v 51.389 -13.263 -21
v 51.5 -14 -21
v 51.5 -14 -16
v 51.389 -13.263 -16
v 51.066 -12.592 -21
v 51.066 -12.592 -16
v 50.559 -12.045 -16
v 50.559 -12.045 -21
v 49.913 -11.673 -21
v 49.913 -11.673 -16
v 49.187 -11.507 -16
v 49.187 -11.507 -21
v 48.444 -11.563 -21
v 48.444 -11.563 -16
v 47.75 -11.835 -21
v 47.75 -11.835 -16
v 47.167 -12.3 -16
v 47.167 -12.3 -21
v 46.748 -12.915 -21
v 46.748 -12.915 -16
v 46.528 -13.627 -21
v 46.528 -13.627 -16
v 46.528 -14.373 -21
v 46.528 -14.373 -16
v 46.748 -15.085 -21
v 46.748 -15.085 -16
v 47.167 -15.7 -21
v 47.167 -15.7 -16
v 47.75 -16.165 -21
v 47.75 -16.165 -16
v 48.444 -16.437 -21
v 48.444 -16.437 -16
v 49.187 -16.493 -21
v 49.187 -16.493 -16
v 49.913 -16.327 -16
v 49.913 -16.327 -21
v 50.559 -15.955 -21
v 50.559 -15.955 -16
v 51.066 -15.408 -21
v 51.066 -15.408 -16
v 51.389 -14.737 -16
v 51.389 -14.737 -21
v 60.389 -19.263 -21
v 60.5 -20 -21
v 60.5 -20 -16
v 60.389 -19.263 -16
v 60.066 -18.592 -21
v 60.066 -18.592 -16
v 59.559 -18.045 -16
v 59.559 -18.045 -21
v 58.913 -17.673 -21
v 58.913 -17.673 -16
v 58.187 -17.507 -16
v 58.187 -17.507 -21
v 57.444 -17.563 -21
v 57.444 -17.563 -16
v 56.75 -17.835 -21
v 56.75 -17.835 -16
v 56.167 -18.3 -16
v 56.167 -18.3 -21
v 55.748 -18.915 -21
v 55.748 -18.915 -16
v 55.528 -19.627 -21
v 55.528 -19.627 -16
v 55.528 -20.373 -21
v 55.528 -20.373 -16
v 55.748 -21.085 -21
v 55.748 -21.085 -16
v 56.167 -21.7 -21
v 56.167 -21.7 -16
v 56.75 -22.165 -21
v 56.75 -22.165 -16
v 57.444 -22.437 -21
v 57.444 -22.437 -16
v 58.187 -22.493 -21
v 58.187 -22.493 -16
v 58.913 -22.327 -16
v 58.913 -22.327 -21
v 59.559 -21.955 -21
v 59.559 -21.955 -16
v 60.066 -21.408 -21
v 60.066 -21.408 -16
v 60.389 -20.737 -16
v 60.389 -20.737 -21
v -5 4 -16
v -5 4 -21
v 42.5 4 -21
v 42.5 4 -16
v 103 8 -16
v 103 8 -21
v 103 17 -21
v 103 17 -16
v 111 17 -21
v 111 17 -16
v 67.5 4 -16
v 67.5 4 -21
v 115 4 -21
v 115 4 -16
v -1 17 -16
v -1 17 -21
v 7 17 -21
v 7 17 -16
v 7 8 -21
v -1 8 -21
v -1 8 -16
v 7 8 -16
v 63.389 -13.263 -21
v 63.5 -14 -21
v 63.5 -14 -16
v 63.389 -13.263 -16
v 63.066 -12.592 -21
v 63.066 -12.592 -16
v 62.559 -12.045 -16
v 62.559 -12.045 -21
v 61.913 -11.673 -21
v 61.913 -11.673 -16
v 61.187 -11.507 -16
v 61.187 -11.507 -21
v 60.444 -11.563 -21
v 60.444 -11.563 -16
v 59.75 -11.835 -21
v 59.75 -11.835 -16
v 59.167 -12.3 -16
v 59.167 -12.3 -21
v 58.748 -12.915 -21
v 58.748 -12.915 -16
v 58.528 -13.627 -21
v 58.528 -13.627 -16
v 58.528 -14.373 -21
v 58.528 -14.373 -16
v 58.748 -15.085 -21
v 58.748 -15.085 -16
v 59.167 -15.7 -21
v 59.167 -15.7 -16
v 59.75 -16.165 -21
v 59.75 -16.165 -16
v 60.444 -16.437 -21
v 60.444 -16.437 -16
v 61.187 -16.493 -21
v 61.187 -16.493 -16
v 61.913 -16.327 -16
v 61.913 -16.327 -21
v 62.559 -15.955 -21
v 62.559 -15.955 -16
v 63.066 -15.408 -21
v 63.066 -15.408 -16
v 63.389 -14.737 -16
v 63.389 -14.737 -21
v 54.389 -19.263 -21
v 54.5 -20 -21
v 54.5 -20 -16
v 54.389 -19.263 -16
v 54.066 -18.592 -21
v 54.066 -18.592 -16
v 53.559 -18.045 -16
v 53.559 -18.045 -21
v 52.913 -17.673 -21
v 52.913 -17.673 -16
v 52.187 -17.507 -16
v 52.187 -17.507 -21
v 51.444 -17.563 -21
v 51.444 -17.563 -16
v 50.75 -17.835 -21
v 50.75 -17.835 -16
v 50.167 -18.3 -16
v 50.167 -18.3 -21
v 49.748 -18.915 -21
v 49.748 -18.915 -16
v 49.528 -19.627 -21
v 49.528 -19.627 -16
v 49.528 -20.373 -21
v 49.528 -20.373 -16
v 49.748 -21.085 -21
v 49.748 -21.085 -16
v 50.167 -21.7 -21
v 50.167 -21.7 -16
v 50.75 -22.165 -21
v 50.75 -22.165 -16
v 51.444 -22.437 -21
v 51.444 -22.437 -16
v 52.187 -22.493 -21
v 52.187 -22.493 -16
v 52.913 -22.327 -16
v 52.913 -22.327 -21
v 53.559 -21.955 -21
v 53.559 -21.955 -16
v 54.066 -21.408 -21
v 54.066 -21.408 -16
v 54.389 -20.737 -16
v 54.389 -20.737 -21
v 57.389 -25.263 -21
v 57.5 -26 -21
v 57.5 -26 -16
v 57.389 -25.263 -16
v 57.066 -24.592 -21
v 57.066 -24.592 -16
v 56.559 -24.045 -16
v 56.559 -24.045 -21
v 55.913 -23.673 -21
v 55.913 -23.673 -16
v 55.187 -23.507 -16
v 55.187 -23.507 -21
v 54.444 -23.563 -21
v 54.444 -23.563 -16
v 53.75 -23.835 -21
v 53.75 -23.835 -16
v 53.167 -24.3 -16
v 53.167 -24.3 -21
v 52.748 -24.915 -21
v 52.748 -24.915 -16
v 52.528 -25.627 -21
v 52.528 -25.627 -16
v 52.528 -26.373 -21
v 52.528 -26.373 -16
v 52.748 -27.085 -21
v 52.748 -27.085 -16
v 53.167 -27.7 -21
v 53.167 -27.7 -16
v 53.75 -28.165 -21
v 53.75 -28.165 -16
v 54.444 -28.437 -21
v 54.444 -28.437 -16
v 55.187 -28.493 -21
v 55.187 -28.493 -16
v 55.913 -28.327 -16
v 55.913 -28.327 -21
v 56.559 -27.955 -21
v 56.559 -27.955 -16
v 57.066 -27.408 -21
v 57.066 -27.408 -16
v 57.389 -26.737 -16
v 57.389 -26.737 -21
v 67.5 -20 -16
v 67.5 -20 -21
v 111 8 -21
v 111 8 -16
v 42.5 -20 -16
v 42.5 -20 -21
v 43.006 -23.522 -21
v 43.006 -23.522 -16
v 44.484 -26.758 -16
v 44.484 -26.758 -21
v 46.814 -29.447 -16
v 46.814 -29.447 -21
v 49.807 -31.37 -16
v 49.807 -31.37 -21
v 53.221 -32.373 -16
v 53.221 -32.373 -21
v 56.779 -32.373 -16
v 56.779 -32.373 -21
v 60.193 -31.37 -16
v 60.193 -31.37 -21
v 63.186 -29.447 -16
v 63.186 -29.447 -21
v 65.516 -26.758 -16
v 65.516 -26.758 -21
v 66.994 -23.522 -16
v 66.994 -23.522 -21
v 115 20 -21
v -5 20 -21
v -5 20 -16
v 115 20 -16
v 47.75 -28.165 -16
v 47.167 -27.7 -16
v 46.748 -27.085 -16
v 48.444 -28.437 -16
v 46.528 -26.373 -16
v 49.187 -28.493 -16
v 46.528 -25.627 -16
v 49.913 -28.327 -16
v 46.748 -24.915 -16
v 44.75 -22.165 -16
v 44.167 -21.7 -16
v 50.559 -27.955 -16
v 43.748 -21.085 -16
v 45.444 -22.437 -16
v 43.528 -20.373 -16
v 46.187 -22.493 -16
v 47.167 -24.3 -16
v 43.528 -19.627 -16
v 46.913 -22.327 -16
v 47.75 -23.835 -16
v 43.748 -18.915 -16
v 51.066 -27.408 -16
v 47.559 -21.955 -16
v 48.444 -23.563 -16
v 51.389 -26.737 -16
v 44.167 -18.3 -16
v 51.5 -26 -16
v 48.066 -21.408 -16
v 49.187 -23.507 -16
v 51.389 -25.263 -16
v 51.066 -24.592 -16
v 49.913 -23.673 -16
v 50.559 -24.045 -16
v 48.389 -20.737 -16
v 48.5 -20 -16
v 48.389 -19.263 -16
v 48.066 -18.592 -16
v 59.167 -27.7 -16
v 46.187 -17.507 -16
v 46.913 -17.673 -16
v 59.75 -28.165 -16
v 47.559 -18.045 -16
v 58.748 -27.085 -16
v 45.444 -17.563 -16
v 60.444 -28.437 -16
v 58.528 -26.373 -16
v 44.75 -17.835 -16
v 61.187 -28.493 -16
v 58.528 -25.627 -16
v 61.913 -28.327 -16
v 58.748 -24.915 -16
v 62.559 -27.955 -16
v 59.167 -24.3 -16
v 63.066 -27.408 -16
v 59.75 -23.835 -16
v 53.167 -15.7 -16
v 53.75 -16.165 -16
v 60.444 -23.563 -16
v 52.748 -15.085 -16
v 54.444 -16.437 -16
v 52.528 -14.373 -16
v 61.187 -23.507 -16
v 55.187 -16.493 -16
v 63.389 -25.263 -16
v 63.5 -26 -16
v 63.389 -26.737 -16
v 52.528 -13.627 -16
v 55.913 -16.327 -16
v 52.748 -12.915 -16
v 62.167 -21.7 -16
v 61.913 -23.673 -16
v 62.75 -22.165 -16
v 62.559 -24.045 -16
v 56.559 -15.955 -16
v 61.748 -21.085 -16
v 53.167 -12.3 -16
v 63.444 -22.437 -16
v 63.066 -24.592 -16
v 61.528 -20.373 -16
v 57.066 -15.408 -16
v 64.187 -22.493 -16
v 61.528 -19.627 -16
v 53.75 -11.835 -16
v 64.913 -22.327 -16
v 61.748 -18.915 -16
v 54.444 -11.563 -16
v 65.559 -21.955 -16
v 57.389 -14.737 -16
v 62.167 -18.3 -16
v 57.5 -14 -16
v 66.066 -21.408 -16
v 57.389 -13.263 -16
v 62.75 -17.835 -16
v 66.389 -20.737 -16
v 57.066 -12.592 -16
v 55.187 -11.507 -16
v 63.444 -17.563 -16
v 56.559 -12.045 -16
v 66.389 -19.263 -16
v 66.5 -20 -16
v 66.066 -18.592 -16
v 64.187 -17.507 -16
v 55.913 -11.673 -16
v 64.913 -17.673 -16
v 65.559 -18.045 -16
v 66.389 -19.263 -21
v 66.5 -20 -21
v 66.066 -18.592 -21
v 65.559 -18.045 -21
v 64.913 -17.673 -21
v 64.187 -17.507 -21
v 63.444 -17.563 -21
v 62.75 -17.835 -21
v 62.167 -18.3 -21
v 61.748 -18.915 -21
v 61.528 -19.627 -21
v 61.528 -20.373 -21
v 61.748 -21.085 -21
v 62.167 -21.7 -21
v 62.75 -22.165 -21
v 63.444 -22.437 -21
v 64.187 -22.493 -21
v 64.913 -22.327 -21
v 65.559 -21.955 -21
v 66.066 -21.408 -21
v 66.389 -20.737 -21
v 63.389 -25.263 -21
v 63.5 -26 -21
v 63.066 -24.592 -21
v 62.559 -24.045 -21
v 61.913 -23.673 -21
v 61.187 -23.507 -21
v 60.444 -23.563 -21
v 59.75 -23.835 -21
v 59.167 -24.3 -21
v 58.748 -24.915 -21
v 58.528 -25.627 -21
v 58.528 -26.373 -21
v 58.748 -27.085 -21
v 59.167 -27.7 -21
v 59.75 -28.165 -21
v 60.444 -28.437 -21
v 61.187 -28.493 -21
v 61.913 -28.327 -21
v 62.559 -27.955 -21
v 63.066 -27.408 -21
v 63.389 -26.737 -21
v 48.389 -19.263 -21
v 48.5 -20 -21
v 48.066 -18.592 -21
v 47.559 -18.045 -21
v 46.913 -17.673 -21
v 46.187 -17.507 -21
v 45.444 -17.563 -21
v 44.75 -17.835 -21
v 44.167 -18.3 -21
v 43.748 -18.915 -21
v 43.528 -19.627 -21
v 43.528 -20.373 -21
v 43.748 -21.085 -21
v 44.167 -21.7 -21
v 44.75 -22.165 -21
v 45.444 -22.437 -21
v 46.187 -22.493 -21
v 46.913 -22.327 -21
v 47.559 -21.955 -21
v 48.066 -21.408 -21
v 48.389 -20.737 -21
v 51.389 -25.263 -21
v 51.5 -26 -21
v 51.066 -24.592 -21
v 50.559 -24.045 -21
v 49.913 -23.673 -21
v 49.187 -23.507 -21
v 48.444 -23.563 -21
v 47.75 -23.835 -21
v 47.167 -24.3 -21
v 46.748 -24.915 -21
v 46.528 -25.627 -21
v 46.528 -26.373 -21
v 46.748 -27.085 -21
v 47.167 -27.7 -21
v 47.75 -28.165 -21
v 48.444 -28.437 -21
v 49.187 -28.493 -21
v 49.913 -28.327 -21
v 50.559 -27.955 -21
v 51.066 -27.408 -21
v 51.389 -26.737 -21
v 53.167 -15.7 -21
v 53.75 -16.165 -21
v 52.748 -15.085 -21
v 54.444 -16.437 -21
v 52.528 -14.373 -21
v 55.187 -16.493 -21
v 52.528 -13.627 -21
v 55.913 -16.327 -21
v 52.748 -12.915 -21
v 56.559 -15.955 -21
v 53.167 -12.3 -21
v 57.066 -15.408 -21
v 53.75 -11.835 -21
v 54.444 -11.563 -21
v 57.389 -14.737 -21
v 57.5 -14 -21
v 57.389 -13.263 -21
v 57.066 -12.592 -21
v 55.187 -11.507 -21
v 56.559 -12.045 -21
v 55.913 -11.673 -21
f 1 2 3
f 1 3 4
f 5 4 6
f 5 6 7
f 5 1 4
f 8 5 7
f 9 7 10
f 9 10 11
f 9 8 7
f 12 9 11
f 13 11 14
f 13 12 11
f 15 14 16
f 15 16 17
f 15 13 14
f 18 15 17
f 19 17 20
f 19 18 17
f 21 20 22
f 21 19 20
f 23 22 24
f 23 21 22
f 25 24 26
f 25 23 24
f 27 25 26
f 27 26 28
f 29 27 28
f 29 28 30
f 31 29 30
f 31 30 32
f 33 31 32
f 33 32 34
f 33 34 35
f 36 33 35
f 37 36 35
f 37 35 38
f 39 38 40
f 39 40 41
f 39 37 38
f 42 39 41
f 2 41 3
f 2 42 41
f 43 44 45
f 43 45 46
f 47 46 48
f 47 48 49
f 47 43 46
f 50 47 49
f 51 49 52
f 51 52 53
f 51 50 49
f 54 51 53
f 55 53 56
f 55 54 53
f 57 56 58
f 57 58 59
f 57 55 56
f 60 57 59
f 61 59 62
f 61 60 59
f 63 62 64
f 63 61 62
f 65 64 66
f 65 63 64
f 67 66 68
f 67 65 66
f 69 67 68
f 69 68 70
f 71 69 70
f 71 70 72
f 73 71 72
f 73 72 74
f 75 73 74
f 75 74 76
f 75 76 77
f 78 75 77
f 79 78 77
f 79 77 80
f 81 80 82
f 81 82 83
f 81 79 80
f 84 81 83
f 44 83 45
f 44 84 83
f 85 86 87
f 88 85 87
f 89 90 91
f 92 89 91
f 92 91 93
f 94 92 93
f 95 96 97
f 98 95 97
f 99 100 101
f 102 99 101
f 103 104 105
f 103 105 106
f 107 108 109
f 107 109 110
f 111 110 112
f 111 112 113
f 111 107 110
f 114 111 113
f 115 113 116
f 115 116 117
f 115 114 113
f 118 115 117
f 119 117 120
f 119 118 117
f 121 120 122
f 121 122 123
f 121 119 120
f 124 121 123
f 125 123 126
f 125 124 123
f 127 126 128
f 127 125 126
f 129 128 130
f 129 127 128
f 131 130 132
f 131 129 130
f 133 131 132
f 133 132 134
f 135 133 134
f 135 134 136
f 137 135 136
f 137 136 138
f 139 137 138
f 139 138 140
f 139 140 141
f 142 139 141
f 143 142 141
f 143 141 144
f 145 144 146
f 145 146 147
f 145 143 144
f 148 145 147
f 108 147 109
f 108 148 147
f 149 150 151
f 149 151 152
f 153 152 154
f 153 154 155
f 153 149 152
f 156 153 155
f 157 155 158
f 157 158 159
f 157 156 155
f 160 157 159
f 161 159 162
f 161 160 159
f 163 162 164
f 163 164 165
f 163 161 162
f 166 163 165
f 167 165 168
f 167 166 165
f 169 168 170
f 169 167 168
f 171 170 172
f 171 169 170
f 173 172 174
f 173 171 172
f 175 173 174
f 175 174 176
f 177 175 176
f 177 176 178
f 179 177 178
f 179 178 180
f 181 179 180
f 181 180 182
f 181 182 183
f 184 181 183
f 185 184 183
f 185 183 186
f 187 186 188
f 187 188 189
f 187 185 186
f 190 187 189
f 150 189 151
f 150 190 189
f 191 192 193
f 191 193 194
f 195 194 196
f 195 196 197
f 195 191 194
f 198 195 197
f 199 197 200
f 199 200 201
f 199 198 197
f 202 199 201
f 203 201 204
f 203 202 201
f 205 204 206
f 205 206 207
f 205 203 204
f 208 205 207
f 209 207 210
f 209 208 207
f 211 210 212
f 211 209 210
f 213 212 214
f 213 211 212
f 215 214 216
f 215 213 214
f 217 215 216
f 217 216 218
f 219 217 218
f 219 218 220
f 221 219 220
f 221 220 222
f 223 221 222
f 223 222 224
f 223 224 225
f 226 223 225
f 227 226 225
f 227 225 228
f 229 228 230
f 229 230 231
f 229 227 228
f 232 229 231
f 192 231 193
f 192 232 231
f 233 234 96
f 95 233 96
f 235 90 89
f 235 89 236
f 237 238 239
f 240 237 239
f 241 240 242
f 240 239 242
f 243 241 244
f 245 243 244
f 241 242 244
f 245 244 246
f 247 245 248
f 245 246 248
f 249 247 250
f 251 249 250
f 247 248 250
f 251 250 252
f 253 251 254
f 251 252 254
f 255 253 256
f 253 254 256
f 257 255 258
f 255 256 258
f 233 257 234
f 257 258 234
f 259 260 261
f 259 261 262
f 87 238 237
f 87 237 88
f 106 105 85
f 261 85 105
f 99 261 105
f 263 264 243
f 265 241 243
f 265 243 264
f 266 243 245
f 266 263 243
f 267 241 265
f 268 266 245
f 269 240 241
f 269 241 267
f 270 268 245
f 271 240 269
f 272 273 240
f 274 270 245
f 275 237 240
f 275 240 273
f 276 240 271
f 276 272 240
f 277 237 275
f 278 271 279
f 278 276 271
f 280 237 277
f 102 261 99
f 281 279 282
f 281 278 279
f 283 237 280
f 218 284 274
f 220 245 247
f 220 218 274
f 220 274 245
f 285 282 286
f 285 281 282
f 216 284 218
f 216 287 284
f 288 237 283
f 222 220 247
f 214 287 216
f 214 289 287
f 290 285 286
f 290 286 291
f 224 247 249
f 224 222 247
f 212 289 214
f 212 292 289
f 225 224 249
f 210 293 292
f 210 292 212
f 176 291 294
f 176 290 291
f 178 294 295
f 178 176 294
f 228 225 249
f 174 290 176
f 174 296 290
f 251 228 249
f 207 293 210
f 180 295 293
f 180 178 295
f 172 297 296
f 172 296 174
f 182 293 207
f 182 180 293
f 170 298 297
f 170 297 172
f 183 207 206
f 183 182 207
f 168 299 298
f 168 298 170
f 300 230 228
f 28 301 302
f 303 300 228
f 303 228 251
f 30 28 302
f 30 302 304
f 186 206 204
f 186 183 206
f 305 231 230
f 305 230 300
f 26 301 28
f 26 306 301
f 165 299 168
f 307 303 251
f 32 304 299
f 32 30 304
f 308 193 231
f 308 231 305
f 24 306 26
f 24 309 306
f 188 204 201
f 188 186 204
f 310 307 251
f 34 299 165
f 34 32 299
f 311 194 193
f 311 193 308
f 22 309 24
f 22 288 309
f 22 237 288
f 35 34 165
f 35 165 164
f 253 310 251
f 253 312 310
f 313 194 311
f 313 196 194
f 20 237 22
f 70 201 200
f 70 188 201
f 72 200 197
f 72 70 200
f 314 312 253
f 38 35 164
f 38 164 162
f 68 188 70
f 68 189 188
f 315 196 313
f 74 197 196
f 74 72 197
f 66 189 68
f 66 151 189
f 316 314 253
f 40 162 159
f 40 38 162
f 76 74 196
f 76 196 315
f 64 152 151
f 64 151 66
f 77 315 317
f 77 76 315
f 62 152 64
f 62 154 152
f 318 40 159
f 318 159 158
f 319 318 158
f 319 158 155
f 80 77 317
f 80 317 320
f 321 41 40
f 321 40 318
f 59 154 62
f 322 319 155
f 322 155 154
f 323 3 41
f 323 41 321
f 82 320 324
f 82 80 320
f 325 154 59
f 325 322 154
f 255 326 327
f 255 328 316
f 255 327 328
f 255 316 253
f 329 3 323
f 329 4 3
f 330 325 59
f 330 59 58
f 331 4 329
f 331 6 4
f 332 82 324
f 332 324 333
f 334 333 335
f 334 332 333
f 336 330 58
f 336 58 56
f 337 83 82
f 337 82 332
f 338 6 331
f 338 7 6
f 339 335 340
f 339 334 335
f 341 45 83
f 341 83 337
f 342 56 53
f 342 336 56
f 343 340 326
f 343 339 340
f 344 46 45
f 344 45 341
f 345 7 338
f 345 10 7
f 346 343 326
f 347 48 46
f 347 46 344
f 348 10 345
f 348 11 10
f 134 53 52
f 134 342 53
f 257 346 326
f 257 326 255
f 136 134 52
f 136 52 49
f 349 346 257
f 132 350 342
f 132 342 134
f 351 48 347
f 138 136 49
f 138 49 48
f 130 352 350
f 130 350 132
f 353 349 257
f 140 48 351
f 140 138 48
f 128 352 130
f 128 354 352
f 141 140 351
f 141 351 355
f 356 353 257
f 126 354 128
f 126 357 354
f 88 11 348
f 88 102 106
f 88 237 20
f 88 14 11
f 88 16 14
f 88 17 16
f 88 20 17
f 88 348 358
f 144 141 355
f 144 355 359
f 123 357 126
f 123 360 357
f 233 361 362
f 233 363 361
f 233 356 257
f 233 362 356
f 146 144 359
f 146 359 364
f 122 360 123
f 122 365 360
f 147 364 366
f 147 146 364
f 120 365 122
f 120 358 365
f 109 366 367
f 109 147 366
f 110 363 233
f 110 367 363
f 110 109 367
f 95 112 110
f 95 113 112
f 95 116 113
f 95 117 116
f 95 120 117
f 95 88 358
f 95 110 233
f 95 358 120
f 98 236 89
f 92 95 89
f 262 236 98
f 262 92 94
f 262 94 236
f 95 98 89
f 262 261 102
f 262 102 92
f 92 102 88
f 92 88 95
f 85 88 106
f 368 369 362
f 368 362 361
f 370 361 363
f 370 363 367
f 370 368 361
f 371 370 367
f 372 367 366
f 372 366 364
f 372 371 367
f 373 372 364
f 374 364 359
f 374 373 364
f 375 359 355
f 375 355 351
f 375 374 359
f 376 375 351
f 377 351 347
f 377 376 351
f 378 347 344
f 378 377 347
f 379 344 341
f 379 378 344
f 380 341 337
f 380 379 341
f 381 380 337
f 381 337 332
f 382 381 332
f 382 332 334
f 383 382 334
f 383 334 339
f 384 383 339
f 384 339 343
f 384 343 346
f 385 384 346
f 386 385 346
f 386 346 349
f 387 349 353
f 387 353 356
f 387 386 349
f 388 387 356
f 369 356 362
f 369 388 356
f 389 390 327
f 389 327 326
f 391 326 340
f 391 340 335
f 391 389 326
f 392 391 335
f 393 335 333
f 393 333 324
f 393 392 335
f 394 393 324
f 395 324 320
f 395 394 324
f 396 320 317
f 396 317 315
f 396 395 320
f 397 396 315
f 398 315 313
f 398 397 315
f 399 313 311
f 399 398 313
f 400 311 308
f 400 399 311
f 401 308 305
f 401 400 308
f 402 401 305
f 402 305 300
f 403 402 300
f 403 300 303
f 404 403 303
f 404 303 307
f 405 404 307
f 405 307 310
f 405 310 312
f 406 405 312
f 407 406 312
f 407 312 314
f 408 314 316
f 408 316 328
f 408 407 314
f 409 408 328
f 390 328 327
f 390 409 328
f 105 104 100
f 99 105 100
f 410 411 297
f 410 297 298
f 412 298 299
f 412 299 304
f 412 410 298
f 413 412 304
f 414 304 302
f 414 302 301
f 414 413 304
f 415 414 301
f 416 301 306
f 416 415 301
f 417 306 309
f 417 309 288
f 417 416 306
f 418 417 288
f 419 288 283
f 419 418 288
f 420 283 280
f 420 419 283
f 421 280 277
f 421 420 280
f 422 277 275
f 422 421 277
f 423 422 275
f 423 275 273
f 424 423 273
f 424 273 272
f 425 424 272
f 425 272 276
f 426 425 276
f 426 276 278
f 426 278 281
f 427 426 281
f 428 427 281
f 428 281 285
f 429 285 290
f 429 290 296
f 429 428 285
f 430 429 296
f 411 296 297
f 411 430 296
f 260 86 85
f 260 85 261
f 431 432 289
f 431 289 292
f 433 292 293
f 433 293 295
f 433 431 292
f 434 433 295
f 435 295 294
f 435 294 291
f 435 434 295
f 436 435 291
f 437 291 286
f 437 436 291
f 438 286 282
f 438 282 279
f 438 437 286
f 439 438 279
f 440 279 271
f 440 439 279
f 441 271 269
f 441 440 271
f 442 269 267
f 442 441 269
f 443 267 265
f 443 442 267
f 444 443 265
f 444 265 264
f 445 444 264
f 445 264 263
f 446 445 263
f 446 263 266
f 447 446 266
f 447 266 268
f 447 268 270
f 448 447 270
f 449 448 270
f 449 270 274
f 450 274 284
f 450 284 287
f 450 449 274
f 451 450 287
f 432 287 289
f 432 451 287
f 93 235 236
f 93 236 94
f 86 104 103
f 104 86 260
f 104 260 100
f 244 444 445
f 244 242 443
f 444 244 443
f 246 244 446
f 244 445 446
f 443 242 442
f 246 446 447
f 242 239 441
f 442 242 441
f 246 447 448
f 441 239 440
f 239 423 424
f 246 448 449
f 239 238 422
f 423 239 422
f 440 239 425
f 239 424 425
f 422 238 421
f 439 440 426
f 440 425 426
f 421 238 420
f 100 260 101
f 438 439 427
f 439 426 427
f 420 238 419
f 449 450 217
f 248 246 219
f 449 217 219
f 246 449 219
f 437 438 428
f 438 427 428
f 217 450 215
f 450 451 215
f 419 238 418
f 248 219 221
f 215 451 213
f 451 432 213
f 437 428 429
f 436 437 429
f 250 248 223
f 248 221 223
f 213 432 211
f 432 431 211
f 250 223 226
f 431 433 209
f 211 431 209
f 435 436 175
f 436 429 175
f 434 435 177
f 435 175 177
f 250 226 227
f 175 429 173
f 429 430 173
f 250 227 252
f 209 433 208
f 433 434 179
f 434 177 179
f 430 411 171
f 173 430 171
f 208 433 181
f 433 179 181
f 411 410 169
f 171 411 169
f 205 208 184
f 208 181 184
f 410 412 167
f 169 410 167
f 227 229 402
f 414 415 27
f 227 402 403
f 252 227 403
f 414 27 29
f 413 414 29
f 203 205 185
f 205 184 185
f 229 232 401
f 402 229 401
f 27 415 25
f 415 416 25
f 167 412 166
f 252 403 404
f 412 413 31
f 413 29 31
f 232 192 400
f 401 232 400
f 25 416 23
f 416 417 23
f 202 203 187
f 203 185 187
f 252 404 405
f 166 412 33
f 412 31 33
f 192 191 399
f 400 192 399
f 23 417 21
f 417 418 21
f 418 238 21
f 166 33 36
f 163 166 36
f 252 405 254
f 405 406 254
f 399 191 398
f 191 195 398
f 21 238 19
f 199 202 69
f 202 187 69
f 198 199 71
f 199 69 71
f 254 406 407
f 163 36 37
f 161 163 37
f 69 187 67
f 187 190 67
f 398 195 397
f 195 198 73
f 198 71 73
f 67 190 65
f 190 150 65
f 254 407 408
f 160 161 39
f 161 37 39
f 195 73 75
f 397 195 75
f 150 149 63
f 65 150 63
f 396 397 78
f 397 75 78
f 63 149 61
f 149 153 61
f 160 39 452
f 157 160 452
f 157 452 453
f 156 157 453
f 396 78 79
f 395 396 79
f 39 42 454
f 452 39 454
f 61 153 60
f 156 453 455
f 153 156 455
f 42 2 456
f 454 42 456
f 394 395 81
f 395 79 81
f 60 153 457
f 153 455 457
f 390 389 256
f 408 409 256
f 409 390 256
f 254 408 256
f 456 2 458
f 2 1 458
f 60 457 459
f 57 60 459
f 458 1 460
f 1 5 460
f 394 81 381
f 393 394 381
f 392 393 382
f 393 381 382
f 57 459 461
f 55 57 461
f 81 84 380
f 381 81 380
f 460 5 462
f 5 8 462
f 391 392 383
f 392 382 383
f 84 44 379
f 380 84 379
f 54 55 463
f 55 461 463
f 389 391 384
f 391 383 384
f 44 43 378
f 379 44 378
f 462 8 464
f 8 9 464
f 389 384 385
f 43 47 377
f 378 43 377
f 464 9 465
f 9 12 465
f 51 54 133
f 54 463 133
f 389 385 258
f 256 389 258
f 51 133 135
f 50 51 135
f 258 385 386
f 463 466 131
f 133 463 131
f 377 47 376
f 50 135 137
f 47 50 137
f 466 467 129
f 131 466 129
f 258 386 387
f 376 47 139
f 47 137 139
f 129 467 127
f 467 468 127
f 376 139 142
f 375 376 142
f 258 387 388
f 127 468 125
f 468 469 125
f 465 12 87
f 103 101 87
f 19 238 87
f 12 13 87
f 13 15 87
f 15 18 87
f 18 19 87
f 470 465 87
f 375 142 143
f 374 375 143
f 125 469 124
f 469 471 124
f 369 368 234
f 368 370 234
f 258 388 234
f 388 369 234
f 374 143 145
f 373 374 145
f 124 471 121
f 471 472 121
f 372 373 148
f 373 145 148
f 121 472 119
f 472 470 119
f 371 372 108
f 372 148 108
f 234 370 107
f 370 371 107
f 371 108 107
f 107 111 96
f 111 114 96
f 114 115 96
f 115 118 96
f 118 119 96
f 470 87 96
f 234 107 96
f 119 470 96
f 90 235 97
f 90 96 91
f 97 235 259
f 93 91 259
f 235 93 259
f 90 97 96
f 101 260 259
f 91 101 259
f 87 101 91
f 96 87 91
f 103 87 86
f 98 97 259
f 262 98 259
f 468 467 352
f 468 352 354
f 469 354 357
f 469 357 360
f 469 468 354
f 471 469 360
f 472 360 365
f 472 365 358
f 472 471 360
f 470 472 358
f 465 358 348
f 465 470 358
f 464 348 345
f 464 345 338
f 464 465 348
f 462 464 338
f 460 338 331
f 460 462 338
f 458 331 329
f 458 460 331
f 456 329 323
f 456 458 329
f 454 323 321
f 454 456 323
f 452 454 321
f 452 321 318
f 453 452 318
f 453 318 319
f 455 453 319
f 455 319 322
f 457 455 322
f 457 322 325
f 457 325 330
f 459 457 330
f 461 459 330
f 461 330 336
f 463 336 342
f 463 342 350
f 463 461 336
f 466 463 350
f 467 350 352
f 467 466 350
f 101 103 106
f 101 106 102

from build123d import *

# Parameters (mm, degrees)
BOX010_W          = 8
BOX010_H          = 9
BOX010_DEPTH      = 5
BOX011_W          = 8
BOX011_H          = 9
BOX011_DEPTH      = 5
CYLINDER012_R     = 2.5
CYLINDER012_DEPTH = 5
CYLINDER010_R     = 2.5
CYLINDER010_DEPTH = 5
CYLINDER009_R     = 2.5
CYLINDER009_DEPTH = 5
CYLINDER008_R     = 2.5
CYLINDER008_DEPTH = 5
CYLINDER005_R     = 2.5
CYLINDER005_DEPTH = 5
CYLINDER003_R     = 2.5
CYLINDER003_DEPTH = 5
CYLINDER004_R     = 2.5
CYLINDER004_DEPTH = 5
CYLINDER006_R     = 2.5
CYLINDER006_DEPTH = 5
CYLINDER007_R     = 2.5
CYLINDER007_DEPTH = 5
CYLINDER013_R     = 2.5
CYLINDER013_DEPTH = 5
BOX013_W          = 25
BOX013_H          = 26
BOX013_DEPTH      = 5
CYLINDER011_R     = 12.5
CYLINDER011_DEPTH = 5
BOX012_W          = 120
BOX012_H          = 16
BOX012_DEPTH      = 5


with BuildPart() as cube010:
    # Box010 → Box010 (new body)
    with BuildSketch(Plane(origin=(103, 8, 0), x_dir=(1, 0, 0), z_dir=(0, 0, 1))):
        with Locations((4, 4.5)):
            Rectangle(BOX010_W, BOX010_H)
    extrude(amount=BOX010_DEPTH)


with BuildPart() as cube011:
    # Box011 → Box011 (new body)
    with BuildSketch(Plane(origin=(-1, 8, 0), x_dir=(1, 0, 0), z_dir=(0, 0, 1))):
        with Locations((4, 4.5)):
            Rectangle(BOX011_W, BOX011_H)
    extrude(amount=BOX011_DEPTH)


with BuildPart() as zylinder012:
    # Cylinder012 → Cylinder012 (new body)
    with BuildSketch(Plane(origin=(6, -6, 0), x_dir=(1, 0, 0), z_dir=(0, 0, 1))):
        Circle(CYLINDER012_R)
    extrude(amount=CYLINDER012_DEPTH)


with BuildPart() as zylinder010:
    # Cylinder010 → Cylinder010 (new body)
    with BuildSketch(Plane(origin=(-6, -6, 0), x_dir=(1, 0, 0), z_dir=(0, 0, 1))):
        Circle(CYLINDER010_R)
    extrude(amount=CYLINDER010_DEPTH)


with BuildPart() as zylinder009:
    # Cylinder009 → Cylinder009 (new body)
    with BuildSketch(Plane(origin=(0, -6, 0), x_dir=(1, 0, 0), z_dir=(0, 0, 1))):
        Circle(CYLINDER009_R)
    extrude(amount=CYLINDER009_DEPTH)


with BuildPart() as zylinder008:
    # Cylinder008 → Cylinder008 (new body)
    with BuildSketch(Plane(origin=(0, 6, 0), x_dir=(1, 0, 0), z_dir=(0, 0, 1))):
        Circle(CYLINDER008_R)
    extrude(amount=CYLINDER008_DEPTH)


with BuildPart() as zylinder005:
    # Cylinder005 → Cylinder005 (new body)
    with BuildSketch(Plane(origin=(-3, 0, 0), x_dir=(1, 0, 0), z_dir=(0, 0, 1))):
        Circle(CYLINDER005_R)
    extrude(amount=CYLINDER005_DEPTH)


with BuildPart() as zylinder003:
    # Cylinder003 → Cylinder003 (new body)
    with BuildSketch(Plane(origin=(3, 0, 0), x_dir=(1, 0, 0), z_dir=(0, 0, 1))):
        Circle(CYLINDER003_R)
    extrude(amount=CYLINDER003_DEPTH)


with BuildPart() as zylinder004:
    # Cylinder004 → Cylinder004 (new body)
    with BuildSketch(Plane(origin=(9, 0, 0), x_dir=(1, 0, 0), z_dir=(0, 0, 1))):
        Circle(CYLINDER004_R)
    extrude(amount=CYLINDER004_DEPTH)


with BuildPart() as zylinder006:
    # Cylinder006 → Cylinder006 (new body)
    with BuildSketch(Plane(origin=(-9, 0, 0), x_dir=(1, 0, 0), z_dir=(0, 0, 1))):
        Circle(CYLINDER006_R)
    extrude(amount=CYLINDER006_DEPTH)


with BuildPart() as zylinder007:
    # Cylinder007 → Cylinder007 (new body)
    with BuildSketch(Plane(origin=(-6, 6, 0), x_dir=(1, 0, 0), z_dir=(0, 0, 1))):
        Circle(CYLINDER007_R)
    extrude(amount=CYLINDER007_DEPTH)


with BuildPart() as fusion007:
    # Cylinder013 → Cylinder013 (new body)
    with BuildSketch(Plane(origin=(6, 6, 0), x_dir=(1, 0, 0), z_dir=(0, 0, 1))):
        Circle(CYLINDER013_R)
    extrude(amount=CYLINDER013_DEPTH)

    # Fusion005: union Zylinder012, Zylinder010, Zylinder009, Zylinder008, Zylinder005, Zylinder003, Zylinder004, Zylinder006, Zylinder007
    add(zylinder012.part)
    add(zylinder010.part)
    add(zylinder009.part)
    add(zylinder008.part)
    add(zylinder005.part)
    add(zylinder003.part)
    add(zylinder004.part)
    add(zylinder006.part)
    add(zylinder007.part)


with BuildPart() as fusion007_1:
    # Fusion005 placement: moved
    add(fusion007.part.moved(Location((55, -20, 0))))

    # Fusion007: union Cube010, Cube011
    add(cube010.part)
    add(cube011.part)


with BuildPart() as cube013:
    # Box013 → Box013 (new body)
    with BuildSketch(Plane(origin=(42.5, -20, 0), x_dir=(1, 0, 0), z_dir=(0, 0, 1))):
        with Locations((12.5, 13)):
            Rectangle(BOX013_W, BOX013_H)
    extrude(amount=BOX013_DEPTH)


with BuildPart() as zylinder011:
    # Cylinder011 → Cylinder011 (new body)
    with BuildSketch(Plane(origin=(55, -20, 0), x_dir=(1, 0, 0), z_dir=(0, 0, 1))):
        Circle(CYLINDER011_R)
    extrude(amount=CYLINDER011_DEPTH)


with BuildPart() as schlauchhalterung:
    # Box012 → Box012 (new body)
    with BuildSketch(Plane(origin=(-5, 4, 0), x_dir=(1, 0, 0), z_dir=(0, 0, 1))):
        with Locations((60, 8)):
            Rectangle(BOX012_W, BOX012_H)
    extrude(amount=BOX012_DEPTH)

    # Fusion006: union Cube013, Zylinder011
    add(cube013.part)
    add(zylinder011.part)

    # Cut003: cut Fusion007
    add(fusion007_1.part, mode=Mode.SUBTRACT)


with BuildPart() as schlauchhalterung_1:
    # Cut003 placement: moved
    add(schlauchhalterung.part.moved(Location((0, 0, -21))))


solid = schlauchhalterung_1.part
